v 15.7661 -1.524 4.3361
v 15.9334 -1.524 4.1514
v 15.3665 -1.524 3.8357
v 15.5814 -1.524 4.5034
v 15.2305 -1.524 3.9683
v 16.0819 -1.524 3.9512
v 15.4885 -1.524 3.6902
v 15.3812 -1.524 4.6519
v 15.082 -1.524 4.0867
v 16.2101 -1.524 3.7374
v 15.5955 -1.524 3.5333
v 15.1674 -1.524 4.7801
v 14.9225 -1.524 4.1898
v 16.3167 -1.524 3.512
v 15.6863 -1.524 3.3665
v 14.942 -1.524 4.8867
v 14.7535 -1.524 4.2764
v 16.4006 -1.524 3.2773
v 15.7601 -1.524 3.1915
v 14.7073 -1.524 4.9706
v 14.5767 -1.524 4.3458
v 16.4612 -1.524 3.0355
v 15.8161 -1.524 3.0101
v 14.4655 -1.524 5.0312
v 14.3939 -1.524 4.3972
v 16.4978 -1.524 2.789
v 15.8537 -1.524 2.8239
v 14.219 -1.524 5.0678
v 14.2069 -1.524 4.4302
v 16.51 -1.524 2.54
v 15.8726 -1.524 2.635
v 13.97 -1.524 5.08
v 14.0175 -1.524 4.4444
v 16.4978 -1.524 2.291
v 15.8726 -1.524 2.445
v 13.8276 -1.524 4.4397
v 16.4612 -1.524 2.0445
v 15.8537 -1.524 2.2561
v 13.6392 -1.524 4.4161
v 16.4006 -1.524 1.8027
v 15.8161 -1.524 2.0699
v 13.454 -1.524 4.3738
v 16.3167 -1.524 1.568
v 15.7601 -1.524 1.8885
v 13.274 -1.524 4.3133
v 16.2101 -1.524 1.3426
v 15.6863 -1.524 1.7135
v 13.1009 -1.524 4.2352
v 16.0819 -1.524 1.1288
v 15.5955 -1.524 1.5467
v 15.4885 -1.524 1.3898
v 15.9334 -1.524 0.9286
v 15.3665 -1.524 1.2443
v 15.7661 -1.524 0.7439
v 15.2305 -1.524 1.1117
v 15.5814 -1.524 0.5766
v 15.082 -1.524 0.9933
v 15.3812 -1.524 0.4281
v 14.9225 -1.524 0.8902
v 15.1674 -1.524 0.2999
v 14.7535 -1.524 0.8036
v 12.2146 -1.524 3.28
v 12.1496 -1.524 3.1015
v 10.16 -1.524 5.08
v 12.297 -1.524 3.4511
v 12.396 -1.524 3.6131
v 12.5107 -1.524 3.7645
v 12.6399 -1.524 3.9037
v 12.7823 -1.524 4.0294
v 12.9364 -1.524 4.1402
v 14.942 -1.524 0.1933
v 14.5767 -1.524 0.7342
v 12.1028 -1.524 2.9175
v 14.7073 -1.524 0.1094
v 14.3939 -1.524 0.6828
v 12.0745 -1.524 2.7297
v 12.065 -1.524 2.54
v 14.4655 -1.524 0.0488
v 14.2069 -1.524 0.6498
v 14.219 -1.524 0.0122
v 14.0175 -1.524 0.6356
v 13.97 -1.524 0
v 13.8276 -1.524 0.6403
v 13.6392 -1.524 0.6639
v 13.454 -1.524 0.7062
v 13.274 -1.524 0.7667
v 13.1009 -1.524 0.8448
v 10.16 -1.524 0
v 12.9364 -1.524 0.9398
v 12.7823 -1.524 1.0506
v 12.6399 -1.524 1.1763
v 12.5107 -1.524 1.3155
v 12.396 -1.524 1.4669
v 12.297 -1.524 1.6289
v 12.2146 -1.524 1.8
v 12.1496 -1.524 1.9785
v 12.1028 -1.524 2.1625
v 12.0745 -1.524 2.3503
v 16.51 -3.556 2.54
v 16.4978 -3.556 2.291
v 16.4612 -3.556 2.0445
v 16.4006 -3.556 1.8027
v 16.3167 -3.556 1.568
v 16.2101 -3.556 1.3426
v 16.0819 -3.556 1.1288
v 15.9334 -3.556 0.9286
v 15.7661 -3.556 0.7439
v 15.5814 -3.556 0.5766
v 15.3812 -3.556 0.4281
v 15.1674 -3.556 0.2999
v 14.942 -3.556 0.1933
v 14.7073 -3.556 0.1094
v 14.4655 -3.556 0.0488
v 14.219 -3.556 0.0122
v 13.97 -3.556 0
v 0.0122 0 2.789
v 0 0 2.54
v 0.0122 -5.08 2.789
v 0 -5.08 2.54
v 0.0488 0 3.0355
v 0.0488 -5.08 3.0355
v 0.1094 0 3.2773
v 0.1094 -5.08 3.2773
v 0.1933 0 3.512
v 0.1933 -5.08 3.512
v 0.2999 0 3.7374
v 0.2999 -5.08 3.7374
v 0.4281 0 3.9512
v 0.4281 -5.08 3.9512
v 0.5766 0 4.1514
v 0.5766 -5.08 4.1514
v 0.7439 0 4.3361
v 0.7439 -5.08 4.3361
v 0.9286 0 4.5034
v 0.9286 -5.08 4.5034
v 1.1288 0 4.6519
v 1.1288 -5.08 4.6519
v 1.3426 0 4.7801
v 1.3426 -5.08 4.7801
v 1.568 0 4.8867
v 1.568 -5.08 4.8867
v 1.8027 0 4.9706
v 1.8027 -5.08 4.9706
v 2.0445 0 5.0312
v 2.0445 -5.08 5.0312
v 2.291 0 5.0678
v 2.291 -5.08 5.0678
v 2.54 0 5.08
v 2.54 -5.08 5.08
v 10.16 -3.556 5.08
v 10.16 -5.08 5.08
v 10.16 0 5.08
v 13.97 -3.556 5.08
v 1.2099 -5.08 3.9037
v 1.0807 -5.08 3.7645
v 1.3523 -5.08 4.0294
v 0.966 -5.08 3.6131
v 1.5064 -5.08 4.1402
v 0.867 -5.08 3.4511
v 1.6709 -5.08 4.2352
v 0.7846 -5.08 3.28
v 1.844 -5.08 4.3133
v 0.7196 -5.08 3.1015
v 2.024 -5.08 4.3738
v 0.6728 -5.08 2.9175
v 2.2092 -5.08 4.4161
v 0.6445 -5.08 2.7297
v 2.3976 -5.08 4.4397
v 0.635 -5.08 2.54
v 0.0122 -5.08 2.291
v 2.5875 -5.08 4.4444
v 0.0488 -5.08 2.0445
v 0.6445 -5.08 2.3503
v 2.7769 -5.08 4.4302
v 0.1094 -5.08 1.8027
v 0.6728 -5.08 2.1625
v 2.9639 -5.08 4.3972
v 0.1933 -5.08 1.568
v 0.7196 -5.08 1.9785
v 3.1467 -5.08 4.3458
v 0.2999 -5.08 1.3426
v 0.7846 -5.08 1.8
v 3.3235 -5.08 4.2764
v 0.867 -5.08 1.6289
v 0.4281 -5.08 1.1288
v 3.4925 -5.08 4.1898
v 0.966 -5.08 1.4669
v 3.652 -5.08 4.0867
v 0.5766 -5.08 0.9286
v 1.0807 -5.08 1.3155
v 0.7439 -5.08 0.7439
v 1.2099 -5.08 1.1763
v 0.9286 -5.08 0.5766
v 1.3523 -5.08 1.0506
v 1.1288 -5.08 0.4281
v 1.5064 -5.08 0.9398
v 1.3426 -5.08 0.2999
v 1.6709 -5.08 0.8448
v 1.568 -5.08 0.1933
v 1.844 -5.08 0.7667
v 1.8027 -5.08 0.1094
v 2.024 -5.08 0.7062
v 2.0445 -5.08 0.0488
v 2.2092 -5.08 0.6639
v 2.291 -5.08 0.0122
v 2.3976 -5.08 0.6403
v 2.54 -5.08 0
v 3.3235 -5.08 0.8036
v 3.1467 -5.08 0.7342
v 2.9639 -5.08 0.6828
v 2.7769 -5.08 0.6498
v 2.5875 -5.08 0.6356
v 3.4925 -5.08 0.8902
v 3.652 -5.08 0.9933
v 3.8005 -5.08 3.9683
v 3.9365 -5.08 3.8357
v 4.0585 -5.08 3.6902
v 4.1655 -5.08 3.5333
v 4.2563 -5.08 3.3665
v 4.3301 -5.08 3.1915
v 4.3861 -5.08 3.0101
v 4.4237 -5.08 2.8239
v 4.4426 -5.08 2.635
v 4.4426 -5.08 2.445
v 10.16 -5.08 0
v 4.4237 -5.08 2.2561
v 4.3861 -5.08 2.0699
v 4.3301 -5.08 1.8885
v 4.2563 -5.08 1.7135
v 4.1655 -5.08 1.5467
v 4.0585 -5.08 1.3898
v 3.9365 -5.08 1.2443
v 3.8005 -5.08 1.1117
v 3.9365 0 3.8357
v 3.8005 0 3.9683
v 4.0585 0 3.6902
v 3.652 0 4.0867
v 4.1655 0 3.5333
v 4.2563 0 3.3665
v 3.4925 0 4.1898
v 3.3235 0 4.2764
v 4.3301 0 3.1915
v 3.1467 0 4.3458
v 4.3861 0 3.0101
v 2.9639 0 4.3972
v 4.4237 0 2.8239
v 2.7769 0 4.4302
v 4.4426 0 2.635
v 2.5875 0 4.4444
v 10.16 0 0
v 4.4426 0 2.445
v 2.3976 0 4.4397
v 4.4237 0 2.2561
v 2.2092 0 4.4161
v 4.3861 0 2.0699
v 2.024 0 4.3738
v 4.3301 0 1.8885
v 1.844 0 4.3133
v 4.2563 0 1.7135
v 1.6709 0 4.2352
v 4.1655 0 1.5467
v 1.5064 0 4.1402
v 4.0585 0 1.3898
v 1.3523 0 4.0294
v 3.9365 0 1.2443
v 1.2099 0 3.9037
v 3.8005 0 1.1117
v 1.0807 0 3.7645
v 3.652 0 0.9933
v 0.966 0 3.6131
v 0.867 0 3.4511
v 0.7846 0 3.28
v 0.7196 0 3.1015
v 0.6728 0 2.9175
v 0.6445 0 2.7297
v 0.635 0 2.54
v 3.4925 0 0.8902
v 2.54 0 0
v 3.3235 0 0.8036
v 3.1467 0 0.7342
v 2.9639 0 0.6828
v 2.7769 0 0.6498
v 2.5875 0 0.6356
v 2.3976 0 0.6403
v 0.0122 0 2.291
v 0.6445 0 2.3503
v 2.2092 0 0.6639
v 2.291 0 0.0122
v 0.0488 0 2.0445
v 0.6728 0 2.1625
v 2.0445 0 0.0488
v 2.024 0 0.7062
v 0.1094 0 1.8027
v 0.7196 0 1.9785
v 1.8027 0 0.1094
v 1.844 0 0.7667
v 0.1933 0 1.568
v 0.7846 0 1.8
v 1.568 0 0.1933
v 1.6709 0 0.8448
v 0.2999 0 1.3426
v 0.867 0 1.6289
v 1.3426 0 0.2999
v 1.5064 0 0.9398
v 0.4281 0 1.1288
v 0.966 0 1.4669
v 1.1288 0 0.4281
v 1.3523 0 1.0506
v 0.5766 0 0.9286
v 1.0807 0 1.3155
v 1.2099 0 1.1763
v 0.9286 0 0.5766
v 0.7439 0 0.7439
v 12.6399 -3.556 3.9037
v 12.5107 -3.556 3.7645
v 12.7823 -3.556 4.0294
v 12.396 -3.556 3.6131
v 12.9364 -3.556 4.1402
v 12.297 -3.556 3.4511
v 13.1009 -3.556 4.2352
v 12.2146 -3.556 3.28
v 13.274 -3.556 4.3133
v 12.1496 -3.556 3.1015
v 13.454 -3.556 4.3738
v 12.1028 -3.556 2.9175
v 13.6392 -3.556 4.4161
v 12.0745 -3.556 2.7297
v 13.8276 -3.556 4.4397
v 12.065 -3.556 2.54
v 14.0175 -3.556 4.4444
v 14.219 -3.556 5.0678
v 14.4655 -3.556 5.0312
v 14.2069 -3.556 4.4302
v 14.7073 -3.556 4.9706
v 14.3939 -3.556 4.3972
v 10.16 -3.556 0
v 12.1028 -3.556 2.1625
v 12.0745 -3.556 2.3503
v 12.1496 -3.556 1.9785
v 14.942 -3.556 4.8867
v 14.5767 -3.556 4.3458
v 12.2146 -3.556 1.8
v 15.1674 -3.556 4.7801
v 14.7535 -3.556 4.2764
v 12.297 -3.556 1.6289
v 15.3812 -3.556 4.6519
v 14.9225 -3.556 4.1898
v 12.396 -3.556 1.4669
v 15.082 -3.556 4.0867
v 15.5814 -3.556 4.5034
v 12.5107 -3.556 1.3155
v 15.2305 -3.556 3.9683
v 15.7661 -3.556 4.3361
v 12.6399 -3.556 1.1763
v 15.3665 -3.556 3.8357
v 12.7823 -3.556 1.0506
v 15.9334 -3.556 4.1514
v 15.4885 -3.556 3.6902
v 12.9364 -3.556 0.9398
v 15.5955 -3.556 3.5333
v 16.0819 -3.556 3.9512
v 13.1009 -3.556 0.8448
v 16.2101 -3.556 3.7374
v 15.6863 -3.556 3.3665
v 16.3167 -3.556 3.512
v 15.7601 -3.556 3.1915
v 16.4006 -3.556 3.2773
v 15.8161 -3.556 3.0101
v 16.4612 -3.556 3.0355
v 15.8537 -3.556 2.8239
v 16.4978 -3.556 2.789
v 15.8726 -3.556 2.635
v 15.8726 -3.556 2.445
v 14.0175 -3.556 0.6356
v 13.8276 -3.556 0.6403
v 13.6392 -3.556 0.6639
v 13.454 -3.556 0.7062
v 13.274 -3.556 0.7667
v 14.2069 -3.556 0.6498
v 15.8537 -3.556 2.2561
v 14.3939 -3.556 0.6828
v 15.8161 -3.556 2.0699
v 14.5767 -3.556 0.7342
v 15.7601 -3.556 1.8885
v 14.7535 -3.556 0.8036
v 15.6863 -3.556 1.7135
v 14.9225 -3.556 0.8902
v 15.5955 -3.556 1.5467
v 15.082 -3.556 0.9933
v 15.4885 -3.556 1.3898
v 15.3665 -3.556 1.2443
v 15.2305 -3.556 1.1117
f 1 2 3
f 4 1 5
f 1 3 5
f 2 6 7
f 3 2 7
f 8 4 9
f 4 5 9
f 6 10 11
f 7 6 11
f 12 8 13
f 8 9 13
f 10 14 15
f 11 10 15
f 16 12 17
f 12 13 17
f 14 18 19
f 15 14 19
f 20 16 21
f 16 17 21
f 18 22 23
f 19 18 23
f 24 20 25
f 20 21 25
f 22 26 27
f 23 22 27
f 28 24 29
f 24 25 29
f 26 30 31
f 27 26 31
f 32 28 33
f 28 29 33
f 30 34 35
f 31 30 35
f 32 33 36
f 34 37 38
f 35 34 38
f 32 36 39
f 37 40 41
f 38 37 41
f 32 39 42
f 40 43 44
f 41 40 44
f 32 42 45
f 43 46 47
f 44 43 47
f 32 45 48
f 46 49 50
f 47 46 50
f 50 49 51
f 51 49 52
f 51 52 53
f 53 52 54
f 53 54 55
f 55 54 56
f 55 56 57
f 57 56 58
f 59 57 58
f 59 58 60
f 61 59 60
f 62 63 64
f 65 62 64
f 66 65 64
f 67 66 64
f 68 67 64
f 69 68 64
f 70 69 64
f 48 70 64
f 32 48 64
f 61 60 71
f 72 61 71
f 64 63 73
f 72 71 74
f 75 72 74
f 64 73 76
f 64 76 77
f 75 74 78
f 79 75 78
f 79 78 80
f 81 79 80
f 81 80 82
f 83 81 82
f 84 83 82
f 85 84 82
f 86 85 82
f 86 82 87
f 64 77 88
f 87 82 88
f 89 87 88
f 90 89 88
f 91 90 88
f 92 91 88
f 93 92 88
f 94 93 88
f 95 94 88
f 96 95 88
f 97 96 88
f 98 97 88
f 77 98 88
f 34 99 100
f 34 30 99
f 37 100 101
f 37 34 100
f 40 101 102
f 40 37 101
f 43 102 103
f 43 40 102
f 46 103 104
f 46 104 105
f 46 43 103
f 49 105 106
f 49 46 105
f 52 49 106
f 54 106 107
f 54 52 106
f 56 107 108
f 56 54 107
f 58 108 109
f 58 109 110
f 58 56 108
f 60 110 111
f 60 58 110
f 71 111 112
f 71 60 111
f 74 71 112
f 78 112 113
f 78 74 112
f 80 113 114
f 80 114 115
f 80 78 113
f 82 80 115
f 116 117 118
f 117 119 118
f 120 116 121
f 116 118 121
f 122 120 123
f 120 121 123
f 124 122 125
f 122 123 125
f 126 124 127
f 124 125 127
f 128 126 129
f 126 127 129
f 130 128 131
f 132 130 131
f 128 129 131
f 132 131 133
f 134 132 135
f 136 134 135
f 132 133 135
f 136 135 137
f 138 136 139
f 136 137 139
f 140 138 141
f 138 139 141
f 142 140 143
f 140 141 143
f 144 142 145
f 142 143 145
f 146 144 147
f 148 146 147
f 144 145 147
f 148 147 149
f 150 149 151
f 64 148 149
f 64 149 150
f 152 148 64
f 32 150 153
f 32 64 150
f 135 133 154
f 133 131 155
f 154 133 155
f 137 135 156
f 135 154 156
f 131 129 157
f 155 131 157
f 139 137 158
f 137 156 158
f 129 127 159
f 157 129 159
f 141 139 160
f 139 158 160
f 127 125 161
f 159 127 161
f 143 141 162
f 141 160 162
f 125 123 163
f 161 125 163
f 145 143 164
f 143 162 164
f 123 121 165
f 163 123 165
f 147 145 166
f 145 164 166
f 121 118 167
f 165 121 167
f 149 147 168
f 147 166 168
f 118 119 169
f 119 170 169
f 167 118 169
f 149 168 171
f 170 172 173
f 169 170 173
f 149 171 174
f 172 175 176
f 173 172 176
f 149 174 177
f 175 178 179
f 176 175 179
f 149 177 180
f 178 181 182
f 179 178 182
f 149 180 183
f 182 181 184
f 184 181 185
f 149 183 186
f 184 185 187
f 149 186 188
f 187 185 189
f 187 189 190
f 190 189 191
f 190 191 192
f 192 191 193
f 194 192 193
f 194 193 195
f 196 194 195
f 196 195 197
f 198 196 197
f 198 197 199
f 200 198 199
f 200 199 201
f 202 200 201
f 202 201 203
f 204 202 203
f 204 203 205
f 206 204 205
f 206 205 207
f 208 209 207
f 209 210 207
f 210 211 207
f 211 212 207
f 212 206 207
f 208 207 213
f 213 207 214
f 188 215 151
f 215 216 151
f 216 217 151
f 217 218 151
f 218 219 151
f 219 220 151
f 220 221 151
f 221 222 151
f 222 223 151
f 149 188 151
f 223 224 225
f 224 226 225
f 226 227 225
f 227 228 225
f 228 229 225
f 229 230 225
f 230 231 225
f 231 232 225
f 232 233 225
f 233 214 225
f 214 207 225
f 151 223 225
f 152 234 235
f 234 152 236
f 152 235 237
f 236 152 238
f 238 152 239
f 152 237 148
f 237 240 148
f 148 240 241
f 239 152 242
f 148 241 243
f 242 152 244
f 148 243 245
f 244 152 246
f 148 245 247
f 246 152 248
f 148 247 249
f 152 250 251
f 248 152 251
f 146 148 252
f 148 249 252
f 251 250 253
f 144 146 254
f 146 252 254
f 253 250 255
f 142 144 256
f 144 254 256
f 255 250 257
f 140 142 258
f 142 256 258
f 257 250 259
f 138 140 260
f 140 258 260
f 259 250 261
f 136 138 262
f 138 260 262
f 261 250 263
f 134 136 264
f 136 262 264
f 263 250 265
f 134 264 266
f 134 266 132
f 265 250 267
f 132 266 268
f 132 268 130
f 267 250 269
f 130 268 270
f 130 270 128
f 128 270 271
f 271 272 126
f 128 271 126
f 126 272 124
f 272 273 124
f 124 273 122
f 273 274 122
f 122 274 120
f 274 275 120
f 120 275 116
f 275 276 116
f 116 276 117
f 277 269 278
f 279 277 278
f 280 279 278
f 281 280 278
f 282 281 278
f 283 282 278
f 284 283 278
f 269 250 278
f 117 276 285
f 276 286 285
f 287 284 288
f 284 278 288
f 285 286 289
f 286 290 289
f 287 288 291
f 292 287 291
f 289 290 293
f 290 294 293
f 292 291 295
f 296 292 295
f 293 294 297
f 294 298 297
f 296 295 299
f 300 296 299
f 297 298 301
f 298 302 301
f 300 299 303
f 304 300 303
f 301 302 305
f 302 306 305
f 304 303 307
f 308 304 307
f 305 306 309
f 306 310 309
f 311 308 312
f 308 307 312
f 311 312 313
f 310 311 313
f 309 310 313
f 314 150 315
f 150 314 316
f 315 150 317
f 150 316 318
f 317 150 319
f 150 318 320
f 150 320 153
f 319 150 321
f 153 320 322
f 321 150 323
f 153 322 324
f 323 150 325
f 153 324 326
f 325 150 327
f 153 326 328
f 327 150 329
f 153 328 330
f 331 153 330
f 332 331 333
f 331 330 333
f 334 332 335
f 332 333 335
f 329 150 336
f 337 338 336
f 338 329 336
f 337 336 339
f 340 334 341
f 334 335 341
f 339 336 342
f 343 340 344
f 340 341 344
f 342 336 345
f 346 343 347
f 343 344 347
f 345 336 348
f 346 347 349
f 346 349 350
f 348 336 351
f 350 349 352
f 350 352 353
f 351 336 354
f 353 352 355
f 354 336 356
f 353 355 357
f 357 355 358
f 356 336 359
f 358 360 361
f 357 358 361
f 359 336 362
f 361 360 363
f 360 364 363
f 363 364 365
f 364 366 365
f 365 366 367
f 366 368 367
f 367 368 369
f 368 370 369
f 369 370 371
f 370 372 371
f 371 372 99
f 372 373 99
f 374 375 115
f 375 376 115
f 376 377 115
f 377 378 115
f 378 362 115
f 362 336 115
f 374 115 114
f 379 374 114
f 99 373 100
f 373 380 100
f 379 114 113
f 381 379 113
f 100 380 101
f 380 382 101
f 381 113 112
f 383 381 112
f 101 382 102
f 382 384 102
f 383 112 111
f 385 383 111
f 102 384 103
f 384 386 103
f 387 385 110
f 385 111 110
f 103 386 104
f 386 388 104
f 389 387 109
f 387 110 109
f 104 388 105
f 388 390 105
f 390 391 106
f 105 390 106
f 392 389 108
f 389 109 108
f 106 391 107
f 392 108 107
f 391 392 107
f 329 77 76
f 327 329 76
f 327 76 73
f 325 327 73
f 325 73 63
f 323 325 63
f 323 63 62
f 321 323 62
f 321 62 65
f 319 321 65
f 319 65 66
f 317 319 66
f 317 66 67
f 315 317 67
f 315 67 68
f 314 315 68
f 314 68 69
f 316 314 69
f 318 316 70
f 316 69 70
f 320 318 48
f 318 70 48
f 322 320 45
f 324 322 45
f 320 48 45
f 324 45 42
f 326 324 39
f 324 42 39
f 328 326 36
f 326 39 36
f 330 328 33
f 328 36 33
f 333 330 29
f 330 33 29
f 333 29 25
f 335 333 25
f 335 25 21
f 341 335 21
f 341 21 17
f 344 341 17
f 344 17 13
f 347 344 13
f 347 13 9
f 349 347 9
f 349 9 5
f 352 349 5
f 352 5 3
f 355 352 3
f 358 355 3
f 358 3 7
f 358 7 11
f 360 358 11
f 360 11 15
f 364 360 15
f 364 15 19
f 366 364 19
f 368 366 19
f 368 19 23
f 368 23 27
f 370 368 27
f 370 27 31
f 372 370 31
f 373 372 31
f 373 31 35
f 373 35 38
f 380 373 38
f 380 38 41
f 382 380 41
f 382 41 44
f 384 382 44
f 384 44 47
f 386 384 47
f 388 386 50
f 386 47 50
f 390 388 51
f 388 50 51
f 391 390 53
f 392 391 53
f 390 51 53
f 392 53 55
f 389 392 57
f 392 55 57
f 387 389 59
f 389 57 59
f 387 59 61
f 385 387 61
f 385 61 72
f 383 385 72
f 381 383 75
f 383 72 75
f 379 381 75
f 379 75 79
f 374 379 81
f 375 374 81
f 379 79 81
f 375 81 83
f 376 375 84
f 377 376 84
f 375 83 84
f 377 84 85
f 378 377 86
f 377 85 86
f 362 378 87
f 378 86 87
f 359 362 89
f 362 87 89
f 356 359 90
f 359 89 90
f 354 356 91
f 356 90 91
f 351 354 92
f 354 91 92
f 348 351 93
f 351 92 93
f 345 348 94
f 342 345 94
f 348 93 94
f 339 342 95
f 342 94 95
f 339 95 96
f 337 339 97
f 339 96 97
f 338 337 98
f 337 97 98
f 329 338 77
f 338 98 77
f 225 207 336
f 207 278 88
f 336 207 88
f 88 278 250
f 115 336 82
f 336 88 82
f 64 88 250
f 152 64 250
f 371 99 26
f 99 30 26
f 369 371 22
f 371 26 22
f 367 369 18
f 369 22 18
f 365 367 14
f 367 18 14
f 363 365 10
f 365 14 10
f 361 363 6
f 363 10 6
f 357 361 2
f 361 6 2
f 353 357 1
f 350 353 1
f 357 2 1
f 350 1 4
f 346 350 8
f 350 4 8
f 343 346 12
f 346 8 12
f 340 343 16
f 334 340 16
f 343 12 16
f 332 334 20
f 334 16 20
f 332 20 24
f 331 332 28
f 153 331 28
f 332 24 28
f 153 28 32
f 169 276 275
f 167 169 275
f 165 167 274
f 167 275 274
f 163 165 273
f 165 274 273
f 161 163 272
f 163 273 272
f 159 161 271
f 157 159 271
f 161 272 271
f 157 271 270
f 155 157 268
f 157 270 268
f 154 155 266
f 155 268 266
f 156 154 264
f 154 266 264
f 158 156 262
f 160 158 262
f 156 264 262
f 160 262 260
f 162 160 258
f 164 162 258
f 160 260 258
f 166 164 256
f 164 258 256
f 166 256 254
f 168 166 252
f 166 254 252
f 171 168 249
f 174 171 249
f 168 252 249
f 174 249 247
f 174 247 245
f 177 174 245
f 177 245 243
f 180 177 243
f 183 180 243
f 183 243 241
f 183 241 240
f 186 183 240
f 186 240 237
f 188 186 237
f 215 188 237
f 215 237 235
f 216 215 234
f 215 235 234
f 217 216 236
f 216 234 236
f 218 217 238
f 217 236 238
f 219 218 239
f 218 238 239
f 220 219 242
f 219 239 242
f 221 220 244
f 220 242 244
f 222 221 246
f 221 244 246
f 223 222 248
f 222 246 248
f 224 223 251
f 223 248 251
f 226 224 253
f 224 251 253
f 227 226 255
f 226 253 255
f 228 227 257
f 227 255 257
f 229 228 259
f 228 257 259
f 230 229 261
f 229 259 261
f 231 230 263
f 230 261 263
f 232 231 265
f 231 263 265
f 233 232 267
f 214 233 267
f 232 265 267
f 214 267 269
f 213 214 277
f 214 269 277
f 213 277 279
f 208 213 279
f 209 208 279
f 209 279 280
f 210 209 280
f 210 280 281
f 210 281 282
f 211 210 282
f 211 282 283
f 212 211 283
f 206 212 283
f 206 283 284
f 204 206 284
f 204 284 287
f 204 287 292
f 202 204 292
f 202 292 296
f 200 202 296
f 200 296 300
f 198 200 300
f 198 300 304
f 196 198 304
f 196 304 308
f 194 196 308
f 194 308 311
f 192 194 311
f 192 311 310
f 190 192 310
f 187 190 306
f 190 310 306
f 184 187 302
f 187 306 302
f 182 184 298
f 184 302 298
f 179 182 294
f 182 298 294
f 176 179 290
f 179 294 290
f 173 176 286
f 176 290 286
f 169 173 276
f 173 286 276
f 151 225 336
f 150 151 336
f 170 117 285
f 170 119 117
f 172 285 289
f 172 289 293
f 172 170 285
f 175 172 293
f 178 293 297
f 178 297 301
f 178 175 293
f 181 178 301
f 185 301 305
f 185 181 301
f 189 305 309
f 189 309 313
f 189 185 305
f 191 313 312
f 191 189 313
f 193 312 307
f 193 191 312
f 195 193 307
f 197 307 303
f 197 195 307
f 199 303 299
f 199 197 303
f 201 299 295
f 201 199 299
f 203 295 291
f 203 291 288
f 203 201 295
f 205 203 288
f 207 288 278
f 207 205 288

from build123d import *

# Parameters (mm, degrees)
F1_DEPTH = 5.08
F2_R     = 2.53999
F3_R     = 1.905
F4_DEPTH = 25.4
F5_R     = 1.905
F6_DEPTH = 5.08


# Not quite as in the source:
# - a fillet or chamfer is up to 0.001 mm smaller than in the source, because OpenCascade refuses the exact size


with BuildPart() as f1:
    # F0 (on Top) → F1 (new body)
    with BuildSketch(Plane.XY):
        Polygon((10.16, 0), (0, 0), (0, -5.08), (10.16, -5.08), (10.16, -3.556), (16.51, -3.556), (16.51, -1.524), (10.16, -1.524), align=None)
    extrude(amount=F1_DEPTH)

    # F2 (radius 2.54 in the source; OpenCascade refuses exactly that, so slightly less here)
    f2_edges = [f1.edges().sort_by_distance(p)[0] for p in [
        (16.51, -2.54, 5.08),
        (16.51, -2.54, 0),
        (0, -2.54, 5.08),
        (0, -2.54, 0),
    ]]
    fillet(f2_edges, radius=F2_R)

    # F3 (on face) → F4 (cut)
    with BuildSketch(Plane(origin=(0, -1.524, 0), x_dir=(-1, 0, 0), z_dir=(0, 1, 0))):
        with Locations((-13.97, 2.54)):
            Circle(F3_R)
    extrude(amount=-F4_DEPTH, mode=Mode.SUBTRACT)

    # F5 (on face) → F6 (cut)
    with BuildSketch(Plane(origin=(0, 0, 0), x_dir=(-1, 0, 0), z_dir=(0, 1, 0))):
        with Locations((-2.54, 2.54)):
            Circle(F5_R)
    extrude(amount=-F6_DEPTH, mode=Mode.SUBTRACT)


solid = f1.part
